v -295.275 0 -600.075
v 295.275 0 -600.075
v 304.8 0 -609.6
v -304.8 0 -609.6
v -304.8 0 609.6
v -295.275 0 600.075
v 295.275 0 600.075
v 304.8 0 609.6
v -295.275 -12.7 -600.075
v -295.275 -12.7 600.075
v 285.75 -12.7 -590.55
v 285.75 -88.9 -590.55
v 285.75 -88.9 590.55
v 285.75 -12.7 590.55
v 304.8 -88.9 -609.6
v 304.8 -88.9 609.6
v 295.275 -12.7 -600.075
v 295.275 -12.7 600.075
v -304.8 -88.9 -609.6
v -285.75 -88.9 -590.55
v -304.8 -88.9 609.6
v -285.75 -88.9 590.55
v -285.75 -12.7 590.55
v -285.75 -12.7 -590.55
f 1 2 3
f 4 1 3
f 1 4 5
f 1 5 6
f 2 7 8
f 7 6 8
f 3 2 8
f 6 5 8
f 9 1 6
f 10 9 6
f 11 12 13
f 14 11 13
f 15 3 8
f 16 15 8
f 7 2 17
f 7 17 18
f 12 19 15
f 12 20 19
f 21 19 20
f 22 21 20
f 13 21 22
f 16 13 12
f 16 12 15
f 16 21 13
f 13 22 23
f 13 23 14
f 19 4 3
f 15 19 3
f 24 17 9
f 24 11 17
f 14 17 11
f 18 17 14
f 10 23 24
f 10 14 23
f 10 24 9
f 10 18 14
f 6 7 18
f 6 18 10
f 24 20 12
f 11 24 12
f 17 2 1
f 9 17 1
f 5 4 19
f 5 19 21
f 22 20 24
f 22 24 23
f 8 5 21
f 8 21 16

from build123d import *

# Parameters (mm, degrees)
F0_W     = 609.6
F0_H     = 1219.2
F1_DEPTH = 88.9
F2_W     = 571.5
F2_H     = 1181.1
F3_DEPTH = 88.9
F4_W     = 590.55
F4_H     = 1200.15
F5_DEPTH = 12.7


with BuildPart() as f1:
    # F0 (on Front) → F1 (new body)
    with BuildSketch(Plane.XZ):
        Rectangle(F0_W, F0_H)
    extrude(amount=F1_DEPTH)

    # F2 (on face) → F3 (cut)
    with BuildSketch(Plane.XZ.offset(88.9)):
        Rectangle(F2_W, F2_H)
    extrude(amount=-F3_DEPTH, mode=Mode.SUBTRACT)

    # F4 (on face) → F5 (cut)
    with BuildSketch(Plane(origin=(0, 0, 0), x_dir=(-1, 0, 0), z_dir=(0, 1, 0))):
        Rectangle(F4_W, F4_H)
    extrude(amount=-F5_DEPTH, mode=Mode.SUBTRACT)


solid = f1.part
